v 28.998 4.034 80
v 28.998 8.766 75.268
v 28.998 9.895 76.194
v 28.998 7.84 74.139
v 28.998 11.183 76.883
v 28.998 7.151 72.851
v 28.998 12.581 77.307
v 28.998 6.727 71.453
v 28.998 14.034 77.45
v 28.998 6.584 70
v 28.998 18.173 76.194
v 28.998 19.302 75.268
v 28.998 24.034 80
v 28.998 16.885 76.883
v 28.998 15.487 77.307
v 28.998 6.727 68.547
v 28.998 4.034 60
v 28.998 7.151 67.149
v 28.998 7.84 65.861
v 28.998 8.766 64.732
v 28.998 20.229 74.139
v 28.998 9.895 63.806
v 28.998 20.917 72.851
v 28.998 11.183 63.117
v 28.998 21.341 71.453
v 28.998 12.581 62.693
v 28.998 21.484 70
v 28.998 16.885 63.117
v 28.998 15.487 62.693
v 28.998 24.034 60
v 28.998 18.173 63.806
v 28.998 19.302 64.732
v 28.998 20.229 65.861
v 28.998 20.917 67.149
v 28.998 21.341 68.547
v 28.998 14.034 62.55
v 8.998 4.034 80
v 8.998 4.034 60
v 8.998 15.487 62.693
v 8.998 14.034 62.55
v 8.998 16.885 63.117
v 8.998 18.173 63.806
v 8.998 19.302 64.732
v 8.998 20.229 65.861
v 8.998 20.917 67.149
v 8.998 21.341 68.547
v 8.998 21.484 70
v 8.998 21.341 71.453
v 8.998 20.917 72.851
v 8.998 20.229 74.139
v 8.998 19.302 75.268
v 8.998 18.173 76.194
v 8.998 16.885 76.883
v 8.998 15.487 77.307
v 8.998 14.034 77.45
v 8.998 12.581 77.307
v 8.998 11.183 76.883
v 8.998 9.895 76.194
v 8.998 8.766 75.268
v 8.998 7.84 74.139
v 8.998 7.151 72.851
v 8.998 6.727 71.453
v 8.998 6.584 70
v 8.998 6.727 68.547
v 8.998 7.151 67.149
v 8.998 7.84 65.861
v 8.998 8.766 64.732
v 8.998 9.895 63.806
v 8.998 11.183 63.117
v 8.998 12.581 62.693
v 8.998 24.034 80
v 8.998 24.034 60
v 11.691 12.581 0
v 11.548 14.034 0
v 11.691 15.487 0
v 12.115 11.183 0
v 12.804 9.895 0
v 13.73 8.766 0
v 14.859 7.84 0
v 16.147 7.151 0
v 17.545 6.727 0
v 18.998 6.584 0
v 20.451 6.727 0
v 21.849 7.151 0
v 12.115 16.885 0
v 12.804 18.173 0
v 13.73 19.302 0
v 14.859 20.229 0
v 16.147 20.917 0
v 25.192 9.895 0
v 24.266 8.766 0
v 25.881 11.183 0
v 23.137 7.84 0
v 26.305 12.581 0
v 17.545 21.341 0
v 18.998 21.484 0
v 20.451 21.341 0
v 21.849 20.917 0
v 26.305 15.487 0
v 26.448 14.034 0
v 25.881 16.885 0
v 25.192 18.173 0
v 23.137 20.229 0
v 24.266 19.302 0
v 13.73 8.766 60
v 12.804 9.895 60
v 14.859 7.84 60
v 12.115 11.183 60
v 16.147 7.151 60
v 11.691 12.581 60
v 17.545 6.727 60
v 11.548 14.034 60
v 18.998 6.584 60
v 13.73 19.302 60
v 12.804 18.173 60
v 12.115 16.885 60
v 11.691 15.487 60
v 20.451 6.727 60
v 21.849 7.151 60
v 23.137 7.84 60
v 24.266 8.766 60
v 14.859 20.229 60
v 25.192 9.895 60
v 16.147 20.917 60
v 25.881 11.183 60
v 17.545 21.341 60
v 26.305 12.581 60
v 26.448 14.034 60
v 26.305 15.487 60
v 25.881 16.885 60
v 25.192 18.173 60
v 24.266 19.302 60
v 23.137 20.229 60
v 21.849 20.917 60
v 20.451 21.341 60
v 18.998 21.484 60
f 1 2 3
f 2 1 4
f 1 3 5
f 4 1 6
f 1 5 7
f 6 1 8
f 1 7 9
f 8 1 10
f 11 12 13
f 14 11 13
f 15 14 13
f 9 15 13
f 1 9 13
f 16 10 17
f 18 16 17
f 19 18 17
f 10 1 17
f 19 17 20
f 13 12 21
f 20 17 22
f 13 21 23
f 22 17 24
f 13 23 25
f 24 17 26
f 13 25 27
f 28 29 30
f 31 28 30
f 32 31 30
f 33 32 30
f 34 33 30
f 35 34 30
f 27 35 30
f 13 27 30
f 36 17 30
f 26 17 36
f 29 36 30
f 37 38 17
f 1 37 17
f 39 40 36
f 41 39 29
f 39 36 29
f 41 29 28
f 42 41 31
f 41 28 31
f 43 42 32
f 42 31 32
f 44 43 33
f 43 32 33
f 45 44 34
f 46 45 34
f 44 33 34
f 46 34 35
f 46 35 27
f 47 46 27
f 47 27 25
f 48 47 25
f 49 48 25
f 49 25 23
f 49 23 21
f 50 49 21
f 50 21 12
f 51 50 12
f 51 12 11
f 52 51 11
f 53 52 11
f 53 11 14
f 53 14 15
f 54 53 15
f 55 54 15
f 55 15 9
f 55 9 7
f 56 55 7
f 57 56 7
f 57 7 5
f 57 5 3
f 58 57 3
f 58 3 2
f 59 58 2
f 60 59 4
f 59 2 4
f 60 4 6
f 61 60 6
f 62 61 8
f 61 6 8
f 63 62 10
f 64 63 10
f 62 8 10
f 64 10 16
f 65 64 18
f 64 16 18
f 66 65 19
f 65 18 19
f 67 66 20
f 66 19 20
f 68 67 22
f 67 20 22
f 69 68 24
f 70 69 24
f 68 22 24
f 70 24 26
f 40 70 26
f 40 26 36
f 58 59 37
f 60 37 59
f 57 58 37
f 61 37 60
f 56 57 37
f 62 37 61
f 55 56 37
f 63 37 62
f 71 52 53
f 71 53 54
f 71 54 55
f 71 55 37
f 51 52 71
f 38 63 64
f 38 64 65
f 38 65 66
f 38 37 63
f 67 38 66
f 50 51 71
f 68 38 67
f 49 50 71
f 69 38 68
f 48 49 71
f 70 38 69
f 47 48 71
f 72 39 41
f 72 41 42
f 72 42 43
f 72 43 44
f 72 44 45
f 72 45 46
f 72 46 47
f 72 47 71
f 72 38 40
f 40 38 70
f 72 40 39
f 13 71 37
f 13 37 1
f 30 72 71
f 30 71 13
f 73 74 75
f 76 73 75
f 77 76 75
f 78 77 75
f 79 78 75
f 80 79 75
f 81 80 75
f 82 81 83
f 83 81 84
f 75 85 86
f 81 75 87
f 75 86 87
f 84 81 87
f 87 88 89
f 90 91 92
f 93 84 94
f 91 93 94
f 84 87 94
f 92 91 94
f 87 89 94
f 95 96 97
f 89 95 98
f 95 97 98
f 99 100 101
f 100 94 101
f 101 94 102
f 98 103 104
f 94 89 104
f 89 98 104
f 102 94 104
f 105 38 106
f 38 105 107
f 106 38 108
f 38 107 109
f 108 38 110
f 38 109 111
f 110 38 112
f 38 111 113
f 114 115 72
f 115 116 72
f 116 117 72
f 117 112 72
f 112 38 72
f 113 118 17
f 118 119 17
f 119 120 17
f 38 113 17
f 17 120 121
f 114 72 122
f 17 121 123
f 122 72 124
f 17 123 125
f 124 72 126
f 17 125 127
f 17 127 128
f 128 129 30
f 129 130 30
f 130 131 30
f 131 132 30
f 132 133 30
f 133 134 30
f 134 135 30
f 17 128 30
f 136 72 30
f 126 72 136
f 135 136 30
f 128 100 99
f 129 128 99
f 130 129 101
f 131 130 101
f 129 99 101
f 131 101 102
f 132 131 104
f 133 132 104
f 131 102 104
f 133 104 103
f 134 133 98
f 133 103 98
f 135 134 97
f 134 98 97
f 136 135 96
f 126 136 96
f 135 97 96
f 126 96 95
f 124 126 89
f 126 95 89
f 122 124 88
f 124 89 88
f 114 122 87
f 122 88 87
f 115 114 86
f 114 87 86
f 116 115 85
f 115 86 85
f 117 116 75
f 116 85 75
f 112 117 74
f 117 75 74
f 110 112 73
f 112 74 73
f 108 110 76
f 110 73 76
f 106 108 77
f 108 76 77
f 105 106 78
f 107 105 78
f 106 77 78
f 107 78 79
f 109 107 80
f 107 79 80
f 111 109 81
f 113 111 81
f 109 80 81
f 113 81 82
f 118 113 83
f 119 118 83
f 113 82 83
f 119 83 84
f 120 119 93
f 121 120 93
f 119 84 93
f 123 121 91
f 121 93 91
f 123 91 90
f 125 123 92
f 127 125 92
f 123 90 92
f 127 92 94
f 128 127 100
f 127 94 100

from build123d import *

# Parameters (mm, degrees)
SKETCH1_R           = 7.45
BOSS_EXTRUDE1_DEPTH = 60
SKETCH2_W           = 20
SKETCH2_H           = 20
BOSS_EXTRUDE2_DEPTH = 20
SKETCH3_R           = 7.45
CUT_EXTRUDE1_DEPTH  = 86.893170968


with BuildPart() as part:
    # Sketch1 → Boss-Extrude1 (new body)
    with BuildSketch(Plane.XY):
        with Locations((18.997949105, 14.034076201)):
            Circle(SKETCH1_R)
    extrude(amount=BOSS_EXTRUDE1_DEPTH)

    # Sketch2 → Boss-Extrude2 (add)
    with BuildSketch(Plane.XY.offset(60)):
        with Locations((18.997949105, 14.034076201)):
            Rectangle(SKETCH2_W, SKETCH2_H)
    extrude(amount=BOSS_EXTRUDE2_DEPTH)

    # Sketch3 → Cut-Extrude1 (cut, through all)
    with BuildSketch(Plane(origin=(28.997949105, 0, 0), x_dir=(0, 0, -1), z_dir=(1, 0, 0))):
        with Locations((-70, 14.034076201)):
            Circle(SKETCH3_R)
    extrude(amount=-CUT_EXTRUDE1_DEPTH, mode=Mode.SUBTRACT)


solid = part.part
